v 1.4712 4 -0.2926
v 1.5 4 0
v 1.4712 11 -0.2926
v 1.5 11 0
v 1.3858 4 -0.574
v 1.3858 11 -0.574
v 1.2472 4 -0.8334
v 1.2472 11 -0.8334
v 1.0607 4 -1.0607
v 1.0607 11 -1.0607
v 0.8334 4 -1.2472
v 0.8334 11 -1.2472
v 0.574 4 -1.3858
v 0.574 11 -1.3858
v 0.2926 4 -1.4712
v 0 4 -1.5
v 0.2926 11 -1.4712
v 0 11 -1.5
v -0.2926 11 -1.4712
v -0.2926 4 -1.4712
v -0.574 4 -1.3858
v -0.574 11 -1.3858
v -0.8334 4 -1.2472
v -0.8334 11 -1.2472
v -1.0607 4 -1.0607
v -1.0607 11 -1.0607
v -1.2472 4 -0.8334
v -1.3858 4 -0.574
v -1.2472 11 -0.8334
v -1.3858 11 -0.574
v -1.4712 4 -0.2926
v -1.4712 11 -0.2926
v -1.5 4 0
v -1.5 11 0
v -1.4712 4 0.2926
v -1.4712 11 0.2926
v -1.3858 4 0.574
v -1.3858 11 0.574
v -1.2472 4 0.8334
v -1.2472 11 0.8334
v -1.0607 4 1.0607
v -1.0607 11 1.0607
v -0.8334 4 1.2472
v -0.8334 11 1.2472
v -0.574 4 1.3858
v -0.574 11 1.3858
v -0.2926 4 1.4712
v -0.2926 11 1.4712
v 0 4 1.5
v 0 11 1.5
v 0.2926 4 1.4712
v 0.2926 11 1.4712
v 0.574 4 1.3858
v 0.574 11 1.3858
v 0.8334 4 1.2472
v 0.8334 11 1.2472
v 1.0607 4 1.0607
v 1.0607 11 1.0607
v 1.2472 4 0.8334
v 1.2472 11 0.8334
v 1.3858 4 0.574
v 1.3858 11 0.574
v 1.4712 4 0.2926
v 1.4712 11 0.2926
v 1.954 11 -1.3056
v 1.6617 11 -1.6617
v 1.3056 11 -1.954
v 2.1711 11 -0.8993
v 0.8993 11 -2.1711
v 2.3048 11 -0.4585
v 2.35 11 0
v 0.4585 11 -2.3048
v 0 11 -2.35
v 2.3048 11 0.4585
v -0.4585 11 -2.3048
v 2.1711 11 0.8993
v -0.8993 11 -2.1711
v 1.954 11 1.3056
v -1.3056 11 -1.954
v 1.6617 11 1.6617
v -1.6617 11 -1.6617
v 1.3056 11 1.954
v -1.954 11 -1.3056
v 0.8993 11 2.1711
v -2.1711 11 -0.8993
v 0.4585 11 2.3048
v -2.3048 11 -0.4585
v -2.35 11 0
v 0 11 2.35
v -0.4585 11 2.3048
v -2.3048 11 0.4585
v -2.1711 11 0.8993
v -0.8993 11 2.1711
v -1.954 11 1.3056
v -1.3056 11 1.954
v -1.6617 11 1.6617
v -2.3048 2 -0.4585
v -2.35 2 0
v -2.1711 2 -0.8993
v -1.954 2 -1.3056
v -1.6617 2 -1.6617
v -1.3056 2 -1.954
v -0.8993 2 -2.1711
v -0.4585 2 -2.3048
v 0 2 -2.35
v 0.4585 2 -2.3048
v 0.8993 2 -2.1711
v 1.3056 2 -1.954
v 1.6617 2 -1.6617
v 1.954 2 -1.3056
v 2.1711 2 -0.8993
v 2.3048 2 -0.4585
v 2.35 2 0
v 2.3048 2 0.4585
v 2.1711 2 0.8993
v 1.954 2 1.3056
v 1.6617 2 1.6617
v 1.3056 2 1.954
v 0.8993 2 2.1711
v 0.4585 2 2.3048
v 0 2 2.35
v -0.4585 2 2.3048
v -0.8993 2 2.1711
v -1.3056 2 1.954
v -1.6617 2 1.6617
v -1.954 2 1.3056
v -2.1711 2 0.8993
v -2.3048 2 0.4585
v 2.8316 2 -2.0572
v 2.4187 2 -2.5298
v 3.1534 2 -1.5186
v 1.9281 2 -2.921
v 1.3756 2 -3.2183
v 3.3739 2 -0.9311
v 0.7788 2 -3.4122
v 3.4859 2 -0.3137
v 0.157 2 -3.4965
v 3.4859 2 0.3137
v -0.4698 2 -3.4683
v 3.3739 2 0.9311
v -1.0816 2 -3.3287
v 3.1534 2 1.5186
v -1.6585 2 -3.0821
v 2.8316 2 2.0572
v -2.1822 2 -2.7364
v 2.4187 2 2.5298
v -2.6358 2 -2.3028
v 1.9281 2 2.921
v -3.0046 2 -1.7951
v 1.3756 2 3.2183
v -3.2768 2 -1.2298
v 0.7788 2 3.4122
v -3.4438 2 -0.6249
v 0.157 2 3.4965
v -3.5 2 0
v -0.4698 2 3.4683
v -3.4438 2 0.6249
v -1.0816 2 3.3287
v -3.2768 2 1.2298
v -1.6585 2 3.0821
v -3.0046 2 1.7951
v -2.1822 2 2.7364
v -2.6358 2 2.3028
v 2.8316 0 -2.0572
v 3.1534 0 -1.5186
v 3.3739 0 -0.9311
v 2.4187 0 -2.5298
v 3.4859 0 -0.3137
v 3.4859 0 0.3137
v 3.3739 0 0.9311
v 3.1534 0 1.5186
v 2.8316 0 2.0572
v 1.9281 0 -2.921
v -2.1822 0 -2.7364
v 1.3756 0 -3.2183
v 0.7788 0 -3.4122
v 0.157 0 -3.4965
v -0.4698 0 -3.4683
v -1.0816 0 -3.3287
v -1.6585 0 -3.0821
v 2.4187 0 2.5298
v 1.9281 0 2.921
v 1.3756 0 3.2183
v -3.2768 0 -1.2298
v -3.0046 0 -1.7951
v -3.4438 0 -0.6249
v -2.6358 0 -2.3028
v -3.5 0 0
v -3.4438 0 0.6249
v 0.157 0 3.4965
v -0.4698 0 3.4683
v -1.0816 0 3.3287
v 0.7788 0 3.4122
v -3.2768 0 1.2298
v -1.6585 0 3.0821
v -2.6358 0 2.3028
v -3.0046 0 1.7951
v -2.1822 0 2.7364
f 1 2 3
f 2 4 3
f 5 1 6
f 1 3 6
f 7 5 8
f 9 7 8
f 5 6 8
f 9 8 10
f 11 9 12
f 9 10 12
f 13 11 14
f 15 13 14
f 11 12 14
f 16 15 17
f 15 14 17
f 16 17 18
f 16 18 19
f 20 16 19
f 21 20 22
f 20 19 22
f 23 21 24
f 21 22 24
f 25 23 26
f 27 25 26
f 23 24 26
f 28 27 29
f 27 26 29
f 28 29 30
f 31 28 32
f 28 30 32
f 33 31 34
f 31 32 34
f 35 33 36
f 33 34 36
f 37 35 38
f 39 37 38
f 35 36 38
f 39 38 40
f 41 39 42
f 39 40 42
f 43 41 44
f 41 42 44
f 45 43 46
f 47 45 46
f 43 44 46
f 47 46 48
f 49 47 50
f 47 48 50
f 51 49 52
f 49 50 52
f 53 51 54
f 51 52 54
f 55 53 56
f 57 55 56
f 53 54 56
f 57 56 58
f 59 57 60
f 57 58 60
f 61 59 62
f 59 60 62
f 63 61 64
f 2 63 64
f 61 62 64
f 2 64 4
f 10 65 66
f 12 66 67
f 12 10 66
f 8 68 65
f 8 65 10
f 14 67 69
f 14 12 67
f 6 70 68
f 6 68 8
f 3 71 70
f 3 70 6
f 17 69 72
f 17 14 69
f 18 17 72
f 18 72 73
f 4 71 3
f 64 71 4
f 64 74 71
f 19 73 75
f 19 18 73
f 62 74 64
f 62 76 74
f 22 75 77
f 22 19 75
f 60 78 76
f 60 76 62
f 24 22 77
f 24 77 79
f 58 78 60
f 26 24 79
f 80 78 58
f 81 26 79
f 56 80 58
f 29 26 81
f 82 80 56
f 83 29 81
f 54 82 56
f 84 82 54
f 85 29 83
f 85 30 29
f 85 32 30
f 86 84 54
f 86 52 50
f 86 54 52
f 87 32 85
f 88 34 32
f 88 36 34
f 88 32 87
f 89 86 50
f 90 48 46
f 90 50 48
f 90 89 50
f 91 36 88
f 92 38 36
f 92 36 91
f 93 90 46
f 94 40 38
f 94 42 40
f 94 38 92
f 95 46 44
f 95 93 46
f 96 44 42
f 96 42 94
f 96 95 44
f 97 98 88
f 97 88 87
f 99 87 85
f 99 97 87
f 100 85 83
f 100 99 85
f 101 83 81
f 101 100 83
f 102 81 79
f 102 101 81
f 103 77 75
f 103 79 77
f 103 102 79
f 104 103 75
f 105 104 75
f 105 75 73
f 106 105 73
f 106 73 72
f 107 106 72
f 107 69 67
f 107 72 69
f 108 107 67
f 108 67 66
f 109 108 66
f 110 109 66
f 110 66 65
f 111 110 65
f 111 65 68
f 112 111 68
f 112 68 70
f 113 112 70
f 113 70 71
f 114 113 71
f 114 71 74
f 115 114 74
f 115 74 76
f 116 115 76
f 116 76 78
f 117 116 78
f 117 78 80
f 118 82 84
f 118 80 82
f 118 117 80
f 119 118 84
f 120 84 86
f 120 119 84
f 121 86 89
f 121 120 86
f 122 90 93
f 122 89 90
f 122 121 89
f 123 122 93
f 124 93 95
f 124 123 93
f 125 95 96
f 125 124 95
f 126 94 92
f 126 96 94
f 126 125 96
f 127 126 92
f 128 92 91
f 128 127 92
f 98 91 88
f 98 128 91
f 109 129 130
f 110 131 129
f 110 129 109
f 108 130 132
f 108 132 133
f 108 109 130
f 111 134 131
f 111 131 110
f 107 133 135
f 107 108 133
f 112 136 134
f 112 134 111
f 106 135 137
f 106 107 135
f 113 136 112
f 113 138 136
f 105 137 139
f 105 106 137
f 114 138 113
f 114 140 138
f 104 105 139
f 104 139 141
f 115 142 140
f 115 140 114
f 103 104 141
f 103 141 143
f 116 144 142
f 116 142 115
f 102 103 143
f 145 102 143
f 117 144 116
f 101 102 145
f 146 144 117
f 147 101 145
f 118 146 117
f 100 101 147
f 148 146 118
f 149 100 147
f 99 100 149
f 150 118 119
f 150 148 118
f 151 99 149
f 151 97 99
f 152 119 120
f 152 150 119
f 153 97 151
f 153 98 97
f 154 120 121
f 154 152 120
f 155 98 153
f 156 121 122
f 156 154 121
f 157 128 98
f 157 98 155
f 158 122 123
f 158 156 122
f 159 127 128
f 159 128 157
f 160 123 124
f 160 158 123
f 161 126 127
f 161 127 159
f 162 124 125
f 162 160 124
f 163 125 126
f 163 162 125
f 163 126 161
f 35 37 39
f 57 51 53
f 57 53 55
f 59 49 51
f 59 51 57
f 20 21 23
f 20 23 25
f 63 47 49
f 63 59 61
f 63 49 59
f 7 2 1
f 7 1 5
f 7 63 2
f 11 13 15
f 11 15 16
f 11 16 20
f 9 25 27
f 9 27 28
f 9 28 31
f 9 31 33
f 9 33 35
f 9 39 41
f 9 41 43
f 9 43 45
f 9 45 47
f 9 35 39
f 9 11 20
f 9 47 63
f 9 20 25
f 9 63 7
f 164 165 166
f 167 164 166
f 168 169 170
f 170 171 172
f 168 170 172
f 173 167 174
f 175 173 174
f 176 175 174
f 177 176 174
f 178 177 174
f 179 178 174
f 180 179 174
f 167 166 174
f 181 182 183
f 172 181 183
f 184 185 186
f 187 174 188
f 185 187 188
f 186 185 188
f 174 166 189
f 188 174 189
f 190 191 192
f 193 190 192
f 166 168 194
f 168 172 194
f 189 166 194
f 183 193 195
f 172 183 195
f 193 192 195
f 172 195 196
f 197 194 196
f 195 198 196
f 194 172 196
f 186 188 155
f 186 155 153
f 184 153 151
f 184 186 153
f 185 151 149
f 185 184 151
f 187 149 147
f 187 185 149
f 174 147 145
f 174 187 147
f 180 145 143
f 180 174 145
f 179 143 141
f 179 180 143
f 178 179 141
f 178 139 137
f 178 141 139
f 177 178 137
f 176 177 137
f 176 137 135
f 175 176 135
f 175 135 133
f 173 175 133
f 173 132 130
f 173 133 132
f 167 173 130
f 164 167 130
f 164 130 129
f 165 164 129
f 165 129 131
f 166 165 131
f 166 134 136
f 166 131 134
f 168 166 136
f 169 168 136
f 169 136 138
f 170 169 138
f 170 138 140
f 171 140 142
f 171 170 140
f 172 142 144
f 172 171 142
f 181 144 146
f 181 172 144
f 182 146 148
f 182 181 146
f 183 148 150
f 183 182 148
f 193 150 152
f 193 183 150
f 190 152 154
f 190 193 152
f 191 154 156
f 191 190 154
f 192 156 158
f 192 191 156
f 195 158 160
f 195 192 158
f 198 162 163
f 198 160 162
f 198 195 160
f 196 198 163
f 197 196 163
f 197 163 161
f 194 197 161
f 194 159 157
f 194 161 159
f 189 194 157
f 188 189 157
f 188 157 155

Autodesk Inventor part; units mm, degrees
ref_plane "YZ Plane" through (0, 0, 0) normal (1, 0, 0) x (0, 1, 0)
ref_plane "XZ Plane" through (0, 0, 0) normal (0, 1, 0) x (-1, 0, 0)
ref_plane "XY Plane" through (0, 0, 0) normal (0, 0, 1) x (1, 0, 0)
sketch "Sketch1" plane through (0, 0, 0) normal (0, 1, 0) x (-1, 0, 0)
  circle A0 centre (0, 0) radius 3.5
  circle A1 centre (0, 0) radius 2.35
  dimension "d0" = 7
  dimension "d1" = 4.7
extrude "Extrusion1" add sketch "Sketch1" along normal blind 11 contours A1
extrude "Extrusion2" add sketch "Sketch1" along normal blind 2
sketch "Sketch2" plane through (0, 11, 0) normal (0, 1, 0) x (1, 0, 0)
  circle A0 centre (0, 0) radius 1.5
  dimension "d6" = 3
extrude "Extrusion3" cut sketch "Sketch2" against normal blind 7
properties part number "Locker1_3DPrint"
